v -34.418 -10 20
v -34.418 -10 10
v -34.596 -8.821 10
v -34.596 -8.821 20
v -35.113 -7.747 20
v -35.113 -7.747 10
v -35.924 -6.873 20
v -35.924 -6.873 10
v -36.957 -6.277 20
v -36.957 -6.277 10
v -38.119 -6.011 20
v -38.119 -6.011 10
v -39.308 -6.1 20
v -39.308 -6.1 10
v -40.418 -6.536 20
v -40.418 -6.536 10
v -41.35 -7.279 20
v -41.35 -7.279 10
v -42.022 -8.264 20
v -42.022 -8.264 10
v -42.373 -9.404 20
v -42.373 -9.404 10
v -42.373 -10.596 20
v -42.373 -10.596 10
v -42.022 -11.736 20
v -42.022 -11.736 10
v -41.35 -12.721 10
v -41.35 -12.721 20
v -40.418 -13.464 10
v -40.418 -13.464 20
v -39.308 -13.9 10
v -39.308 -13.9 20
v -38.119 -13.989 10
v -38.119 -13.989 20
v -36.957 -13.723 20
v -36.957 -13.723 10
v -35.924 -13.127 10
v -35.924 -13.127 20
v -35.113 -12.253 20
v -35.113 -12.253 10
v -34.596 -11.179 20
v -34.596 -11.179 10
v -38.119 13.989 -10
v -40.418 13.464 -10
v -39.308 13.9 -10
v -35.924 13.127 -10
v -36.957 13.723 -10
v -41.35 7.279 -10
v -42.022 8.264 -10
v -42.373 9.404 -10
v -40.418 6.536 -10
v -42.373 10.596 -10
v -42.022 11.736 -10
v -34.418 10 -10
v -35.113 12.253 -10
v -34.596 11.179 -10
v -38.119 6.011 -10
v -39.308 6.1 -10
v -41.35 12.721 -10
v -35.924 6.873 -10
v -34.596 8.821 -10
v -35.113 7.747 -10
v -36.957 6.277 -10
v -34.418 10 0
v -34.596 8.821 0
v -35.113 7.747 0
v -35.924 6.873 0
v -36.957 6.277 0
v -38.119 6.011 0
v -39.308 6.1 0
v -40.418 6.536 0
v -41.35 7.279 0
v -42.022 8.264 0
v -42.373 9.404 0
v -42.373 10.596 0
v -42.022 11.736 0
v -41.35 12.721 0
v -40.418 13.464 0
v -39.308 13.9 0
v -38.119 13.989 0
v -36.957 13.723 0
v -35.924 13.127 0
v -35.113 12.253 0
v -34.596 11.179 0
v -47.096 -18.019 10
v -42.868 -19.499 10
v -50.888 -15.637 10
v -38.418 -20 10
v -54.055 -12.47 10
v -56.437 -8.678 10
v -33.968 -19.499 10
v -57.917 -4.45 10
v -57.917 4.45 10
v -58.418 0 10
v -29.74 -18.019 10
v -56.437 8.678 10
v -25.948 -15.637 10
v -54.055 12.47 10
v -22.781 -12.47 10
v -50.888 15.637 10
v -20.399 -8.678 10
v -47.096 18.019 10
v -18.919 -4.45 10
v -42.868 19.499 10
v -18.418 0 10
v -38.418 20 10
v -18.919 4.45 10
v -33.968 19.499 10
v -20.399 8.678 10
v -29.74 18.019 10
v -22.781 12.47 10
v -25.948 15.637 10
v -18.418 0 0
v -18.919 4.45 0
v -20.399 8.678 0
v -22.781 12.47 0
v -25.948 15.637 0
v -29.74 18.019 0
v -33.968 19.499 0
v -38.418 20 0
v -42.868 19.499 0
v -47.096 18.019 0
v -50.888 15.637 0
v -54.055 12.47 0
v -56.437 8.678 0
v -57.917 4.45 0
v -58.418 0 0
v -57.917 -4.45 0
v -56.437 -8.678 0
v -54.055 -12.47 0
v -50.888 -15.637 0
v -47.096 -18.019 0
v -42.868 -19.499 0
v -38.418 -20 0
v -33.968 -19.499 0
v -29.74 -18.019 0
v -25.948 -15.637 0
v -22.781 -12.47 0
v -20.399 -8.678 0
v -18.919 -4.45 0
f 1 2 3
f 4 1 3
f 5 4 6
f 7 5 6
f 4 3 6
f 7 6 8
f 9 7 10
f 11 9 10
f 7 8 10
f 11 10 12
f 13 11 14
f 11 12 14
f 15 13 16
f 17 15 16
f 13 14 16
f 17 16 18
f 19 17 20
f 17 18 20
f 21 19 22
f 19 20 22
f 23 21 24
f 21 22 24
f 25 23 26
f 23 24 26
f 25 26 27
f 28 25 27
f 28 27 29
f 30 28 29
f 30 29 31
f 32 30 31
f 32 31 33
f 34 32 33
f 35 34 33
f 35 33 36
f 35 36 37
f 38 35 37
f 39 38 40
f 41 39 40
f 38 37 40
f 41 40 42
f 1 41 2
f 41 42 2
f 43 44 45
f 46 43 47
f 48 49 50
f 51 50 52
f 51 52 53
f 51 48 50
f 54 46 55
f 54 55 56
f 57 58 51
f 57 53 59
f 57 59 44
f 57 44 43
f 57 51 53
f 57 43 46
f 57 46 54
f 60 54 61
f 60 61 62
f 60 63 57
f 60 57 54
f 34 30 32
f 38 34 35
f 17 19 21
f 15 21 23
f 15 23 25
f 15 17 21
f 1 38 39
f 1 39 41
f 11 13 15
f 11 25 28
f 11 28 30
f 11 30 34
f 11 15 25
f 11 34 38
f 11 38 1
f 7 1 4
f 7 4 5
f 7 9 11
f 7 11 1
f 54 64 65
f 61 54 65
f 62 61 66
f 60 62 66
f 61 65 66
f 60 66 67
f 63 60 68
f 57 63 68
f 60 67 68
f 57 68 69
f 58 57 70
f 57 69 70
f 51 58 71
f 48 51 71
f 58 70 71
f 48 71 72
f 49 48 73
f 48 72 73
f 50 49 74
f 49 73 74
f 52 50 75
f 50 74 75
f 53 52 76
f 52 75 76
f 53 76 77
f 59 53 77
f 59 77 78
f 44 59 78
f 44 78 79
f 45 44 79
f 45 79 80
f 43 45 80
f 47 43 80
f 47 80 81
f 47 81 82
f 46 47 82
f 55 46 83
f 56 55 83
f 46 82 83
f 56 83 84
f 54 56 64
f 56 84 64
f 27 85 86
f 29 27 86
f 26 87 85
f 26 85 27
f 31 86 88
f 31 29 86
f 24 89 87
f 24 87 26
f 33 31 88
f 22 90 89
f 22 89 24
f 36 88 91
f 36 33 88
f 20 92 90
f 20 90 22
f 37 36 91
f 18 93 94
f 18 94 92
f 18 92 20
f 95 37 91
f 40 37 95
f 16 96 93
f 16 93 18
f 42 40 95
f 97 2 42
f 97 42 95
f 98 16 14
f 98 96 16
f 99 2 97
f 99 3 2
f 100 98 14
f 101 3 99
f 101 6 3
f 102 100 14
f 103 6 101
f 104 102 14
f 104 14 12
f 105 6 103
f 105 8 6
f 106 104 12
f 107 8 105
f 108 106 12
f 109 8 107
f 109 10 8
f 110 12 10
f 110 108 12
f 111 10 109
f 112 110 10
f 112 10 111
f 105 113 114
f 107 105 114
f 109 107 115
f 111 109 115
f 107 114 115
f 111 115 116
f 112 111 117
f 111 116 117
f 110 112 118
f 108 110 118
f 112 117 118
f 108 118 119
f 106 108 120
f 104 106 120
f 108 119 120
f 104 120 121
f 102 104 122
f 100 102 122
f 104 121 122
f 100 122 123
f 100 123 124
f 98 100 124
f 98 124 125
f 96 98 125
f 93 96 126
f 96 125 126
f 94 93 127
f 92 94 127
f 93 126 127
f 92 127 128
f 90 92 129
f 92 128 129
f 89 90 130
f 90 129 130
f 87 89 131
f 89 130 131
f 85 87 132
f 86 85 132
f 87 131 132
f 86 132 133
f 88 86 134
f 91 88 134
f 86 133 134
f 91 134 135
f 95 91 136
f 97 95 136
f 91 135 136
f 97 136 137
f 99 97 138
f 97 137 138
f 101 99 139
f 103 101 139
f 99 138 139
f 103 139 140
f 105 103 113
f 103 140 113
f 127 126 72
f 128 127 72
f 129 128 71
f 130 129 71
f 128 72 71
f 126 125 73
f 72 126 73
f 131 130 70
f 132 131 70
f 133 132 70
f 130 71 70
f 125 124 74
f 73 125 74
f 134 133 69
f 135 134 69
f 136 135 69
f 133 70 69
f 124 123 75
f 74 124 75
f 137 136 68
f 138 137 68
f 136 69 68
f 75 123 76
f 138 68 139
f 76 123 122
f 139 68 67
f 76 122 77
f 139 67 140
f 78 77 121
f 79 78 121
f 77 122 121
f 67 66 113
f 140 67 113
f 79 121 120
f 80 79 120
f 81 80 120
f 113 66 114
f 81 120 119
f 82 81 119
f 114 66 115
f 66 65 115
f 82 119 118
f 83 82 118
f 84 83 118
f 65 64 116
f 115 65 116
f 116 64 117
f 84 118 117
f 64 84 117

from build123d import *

# Parameters (mm, degrees)
F0_R     = 20
F1_DEPTH = 10
F2_R     = 4
F3_DEPTH = 10
F4_R     = 4
F5_DEPTH = 10


with BuildPart() as f1:
    # F0 (on Top) → F1 (new body)
    with BuildSketch(Plane.XY):
        with Locations((-38.417947, 0)):
            Circle(F0_R)
    extrude(amount=F1_DEPTH)

    # F2 (on face) → F3 (join)
    with BuildSketch(Plane(origin=(0, 0, 0), x_dir=(1, 0, 0), z_dir=(0, 0, -1))):
        with Locations((-38.417947, -10)):
            Circle(F2_R)
    extrude(amount=F3_DEPTH)

    # F4 (on face) → F5 (join)
    with BuildSketch(Plane.XY.offset(10)):
        with Locations((-38.417947, -10)):
            Circle(F4_R)
    extrude(amount=F5_DEPTH)


solid = f1.part
